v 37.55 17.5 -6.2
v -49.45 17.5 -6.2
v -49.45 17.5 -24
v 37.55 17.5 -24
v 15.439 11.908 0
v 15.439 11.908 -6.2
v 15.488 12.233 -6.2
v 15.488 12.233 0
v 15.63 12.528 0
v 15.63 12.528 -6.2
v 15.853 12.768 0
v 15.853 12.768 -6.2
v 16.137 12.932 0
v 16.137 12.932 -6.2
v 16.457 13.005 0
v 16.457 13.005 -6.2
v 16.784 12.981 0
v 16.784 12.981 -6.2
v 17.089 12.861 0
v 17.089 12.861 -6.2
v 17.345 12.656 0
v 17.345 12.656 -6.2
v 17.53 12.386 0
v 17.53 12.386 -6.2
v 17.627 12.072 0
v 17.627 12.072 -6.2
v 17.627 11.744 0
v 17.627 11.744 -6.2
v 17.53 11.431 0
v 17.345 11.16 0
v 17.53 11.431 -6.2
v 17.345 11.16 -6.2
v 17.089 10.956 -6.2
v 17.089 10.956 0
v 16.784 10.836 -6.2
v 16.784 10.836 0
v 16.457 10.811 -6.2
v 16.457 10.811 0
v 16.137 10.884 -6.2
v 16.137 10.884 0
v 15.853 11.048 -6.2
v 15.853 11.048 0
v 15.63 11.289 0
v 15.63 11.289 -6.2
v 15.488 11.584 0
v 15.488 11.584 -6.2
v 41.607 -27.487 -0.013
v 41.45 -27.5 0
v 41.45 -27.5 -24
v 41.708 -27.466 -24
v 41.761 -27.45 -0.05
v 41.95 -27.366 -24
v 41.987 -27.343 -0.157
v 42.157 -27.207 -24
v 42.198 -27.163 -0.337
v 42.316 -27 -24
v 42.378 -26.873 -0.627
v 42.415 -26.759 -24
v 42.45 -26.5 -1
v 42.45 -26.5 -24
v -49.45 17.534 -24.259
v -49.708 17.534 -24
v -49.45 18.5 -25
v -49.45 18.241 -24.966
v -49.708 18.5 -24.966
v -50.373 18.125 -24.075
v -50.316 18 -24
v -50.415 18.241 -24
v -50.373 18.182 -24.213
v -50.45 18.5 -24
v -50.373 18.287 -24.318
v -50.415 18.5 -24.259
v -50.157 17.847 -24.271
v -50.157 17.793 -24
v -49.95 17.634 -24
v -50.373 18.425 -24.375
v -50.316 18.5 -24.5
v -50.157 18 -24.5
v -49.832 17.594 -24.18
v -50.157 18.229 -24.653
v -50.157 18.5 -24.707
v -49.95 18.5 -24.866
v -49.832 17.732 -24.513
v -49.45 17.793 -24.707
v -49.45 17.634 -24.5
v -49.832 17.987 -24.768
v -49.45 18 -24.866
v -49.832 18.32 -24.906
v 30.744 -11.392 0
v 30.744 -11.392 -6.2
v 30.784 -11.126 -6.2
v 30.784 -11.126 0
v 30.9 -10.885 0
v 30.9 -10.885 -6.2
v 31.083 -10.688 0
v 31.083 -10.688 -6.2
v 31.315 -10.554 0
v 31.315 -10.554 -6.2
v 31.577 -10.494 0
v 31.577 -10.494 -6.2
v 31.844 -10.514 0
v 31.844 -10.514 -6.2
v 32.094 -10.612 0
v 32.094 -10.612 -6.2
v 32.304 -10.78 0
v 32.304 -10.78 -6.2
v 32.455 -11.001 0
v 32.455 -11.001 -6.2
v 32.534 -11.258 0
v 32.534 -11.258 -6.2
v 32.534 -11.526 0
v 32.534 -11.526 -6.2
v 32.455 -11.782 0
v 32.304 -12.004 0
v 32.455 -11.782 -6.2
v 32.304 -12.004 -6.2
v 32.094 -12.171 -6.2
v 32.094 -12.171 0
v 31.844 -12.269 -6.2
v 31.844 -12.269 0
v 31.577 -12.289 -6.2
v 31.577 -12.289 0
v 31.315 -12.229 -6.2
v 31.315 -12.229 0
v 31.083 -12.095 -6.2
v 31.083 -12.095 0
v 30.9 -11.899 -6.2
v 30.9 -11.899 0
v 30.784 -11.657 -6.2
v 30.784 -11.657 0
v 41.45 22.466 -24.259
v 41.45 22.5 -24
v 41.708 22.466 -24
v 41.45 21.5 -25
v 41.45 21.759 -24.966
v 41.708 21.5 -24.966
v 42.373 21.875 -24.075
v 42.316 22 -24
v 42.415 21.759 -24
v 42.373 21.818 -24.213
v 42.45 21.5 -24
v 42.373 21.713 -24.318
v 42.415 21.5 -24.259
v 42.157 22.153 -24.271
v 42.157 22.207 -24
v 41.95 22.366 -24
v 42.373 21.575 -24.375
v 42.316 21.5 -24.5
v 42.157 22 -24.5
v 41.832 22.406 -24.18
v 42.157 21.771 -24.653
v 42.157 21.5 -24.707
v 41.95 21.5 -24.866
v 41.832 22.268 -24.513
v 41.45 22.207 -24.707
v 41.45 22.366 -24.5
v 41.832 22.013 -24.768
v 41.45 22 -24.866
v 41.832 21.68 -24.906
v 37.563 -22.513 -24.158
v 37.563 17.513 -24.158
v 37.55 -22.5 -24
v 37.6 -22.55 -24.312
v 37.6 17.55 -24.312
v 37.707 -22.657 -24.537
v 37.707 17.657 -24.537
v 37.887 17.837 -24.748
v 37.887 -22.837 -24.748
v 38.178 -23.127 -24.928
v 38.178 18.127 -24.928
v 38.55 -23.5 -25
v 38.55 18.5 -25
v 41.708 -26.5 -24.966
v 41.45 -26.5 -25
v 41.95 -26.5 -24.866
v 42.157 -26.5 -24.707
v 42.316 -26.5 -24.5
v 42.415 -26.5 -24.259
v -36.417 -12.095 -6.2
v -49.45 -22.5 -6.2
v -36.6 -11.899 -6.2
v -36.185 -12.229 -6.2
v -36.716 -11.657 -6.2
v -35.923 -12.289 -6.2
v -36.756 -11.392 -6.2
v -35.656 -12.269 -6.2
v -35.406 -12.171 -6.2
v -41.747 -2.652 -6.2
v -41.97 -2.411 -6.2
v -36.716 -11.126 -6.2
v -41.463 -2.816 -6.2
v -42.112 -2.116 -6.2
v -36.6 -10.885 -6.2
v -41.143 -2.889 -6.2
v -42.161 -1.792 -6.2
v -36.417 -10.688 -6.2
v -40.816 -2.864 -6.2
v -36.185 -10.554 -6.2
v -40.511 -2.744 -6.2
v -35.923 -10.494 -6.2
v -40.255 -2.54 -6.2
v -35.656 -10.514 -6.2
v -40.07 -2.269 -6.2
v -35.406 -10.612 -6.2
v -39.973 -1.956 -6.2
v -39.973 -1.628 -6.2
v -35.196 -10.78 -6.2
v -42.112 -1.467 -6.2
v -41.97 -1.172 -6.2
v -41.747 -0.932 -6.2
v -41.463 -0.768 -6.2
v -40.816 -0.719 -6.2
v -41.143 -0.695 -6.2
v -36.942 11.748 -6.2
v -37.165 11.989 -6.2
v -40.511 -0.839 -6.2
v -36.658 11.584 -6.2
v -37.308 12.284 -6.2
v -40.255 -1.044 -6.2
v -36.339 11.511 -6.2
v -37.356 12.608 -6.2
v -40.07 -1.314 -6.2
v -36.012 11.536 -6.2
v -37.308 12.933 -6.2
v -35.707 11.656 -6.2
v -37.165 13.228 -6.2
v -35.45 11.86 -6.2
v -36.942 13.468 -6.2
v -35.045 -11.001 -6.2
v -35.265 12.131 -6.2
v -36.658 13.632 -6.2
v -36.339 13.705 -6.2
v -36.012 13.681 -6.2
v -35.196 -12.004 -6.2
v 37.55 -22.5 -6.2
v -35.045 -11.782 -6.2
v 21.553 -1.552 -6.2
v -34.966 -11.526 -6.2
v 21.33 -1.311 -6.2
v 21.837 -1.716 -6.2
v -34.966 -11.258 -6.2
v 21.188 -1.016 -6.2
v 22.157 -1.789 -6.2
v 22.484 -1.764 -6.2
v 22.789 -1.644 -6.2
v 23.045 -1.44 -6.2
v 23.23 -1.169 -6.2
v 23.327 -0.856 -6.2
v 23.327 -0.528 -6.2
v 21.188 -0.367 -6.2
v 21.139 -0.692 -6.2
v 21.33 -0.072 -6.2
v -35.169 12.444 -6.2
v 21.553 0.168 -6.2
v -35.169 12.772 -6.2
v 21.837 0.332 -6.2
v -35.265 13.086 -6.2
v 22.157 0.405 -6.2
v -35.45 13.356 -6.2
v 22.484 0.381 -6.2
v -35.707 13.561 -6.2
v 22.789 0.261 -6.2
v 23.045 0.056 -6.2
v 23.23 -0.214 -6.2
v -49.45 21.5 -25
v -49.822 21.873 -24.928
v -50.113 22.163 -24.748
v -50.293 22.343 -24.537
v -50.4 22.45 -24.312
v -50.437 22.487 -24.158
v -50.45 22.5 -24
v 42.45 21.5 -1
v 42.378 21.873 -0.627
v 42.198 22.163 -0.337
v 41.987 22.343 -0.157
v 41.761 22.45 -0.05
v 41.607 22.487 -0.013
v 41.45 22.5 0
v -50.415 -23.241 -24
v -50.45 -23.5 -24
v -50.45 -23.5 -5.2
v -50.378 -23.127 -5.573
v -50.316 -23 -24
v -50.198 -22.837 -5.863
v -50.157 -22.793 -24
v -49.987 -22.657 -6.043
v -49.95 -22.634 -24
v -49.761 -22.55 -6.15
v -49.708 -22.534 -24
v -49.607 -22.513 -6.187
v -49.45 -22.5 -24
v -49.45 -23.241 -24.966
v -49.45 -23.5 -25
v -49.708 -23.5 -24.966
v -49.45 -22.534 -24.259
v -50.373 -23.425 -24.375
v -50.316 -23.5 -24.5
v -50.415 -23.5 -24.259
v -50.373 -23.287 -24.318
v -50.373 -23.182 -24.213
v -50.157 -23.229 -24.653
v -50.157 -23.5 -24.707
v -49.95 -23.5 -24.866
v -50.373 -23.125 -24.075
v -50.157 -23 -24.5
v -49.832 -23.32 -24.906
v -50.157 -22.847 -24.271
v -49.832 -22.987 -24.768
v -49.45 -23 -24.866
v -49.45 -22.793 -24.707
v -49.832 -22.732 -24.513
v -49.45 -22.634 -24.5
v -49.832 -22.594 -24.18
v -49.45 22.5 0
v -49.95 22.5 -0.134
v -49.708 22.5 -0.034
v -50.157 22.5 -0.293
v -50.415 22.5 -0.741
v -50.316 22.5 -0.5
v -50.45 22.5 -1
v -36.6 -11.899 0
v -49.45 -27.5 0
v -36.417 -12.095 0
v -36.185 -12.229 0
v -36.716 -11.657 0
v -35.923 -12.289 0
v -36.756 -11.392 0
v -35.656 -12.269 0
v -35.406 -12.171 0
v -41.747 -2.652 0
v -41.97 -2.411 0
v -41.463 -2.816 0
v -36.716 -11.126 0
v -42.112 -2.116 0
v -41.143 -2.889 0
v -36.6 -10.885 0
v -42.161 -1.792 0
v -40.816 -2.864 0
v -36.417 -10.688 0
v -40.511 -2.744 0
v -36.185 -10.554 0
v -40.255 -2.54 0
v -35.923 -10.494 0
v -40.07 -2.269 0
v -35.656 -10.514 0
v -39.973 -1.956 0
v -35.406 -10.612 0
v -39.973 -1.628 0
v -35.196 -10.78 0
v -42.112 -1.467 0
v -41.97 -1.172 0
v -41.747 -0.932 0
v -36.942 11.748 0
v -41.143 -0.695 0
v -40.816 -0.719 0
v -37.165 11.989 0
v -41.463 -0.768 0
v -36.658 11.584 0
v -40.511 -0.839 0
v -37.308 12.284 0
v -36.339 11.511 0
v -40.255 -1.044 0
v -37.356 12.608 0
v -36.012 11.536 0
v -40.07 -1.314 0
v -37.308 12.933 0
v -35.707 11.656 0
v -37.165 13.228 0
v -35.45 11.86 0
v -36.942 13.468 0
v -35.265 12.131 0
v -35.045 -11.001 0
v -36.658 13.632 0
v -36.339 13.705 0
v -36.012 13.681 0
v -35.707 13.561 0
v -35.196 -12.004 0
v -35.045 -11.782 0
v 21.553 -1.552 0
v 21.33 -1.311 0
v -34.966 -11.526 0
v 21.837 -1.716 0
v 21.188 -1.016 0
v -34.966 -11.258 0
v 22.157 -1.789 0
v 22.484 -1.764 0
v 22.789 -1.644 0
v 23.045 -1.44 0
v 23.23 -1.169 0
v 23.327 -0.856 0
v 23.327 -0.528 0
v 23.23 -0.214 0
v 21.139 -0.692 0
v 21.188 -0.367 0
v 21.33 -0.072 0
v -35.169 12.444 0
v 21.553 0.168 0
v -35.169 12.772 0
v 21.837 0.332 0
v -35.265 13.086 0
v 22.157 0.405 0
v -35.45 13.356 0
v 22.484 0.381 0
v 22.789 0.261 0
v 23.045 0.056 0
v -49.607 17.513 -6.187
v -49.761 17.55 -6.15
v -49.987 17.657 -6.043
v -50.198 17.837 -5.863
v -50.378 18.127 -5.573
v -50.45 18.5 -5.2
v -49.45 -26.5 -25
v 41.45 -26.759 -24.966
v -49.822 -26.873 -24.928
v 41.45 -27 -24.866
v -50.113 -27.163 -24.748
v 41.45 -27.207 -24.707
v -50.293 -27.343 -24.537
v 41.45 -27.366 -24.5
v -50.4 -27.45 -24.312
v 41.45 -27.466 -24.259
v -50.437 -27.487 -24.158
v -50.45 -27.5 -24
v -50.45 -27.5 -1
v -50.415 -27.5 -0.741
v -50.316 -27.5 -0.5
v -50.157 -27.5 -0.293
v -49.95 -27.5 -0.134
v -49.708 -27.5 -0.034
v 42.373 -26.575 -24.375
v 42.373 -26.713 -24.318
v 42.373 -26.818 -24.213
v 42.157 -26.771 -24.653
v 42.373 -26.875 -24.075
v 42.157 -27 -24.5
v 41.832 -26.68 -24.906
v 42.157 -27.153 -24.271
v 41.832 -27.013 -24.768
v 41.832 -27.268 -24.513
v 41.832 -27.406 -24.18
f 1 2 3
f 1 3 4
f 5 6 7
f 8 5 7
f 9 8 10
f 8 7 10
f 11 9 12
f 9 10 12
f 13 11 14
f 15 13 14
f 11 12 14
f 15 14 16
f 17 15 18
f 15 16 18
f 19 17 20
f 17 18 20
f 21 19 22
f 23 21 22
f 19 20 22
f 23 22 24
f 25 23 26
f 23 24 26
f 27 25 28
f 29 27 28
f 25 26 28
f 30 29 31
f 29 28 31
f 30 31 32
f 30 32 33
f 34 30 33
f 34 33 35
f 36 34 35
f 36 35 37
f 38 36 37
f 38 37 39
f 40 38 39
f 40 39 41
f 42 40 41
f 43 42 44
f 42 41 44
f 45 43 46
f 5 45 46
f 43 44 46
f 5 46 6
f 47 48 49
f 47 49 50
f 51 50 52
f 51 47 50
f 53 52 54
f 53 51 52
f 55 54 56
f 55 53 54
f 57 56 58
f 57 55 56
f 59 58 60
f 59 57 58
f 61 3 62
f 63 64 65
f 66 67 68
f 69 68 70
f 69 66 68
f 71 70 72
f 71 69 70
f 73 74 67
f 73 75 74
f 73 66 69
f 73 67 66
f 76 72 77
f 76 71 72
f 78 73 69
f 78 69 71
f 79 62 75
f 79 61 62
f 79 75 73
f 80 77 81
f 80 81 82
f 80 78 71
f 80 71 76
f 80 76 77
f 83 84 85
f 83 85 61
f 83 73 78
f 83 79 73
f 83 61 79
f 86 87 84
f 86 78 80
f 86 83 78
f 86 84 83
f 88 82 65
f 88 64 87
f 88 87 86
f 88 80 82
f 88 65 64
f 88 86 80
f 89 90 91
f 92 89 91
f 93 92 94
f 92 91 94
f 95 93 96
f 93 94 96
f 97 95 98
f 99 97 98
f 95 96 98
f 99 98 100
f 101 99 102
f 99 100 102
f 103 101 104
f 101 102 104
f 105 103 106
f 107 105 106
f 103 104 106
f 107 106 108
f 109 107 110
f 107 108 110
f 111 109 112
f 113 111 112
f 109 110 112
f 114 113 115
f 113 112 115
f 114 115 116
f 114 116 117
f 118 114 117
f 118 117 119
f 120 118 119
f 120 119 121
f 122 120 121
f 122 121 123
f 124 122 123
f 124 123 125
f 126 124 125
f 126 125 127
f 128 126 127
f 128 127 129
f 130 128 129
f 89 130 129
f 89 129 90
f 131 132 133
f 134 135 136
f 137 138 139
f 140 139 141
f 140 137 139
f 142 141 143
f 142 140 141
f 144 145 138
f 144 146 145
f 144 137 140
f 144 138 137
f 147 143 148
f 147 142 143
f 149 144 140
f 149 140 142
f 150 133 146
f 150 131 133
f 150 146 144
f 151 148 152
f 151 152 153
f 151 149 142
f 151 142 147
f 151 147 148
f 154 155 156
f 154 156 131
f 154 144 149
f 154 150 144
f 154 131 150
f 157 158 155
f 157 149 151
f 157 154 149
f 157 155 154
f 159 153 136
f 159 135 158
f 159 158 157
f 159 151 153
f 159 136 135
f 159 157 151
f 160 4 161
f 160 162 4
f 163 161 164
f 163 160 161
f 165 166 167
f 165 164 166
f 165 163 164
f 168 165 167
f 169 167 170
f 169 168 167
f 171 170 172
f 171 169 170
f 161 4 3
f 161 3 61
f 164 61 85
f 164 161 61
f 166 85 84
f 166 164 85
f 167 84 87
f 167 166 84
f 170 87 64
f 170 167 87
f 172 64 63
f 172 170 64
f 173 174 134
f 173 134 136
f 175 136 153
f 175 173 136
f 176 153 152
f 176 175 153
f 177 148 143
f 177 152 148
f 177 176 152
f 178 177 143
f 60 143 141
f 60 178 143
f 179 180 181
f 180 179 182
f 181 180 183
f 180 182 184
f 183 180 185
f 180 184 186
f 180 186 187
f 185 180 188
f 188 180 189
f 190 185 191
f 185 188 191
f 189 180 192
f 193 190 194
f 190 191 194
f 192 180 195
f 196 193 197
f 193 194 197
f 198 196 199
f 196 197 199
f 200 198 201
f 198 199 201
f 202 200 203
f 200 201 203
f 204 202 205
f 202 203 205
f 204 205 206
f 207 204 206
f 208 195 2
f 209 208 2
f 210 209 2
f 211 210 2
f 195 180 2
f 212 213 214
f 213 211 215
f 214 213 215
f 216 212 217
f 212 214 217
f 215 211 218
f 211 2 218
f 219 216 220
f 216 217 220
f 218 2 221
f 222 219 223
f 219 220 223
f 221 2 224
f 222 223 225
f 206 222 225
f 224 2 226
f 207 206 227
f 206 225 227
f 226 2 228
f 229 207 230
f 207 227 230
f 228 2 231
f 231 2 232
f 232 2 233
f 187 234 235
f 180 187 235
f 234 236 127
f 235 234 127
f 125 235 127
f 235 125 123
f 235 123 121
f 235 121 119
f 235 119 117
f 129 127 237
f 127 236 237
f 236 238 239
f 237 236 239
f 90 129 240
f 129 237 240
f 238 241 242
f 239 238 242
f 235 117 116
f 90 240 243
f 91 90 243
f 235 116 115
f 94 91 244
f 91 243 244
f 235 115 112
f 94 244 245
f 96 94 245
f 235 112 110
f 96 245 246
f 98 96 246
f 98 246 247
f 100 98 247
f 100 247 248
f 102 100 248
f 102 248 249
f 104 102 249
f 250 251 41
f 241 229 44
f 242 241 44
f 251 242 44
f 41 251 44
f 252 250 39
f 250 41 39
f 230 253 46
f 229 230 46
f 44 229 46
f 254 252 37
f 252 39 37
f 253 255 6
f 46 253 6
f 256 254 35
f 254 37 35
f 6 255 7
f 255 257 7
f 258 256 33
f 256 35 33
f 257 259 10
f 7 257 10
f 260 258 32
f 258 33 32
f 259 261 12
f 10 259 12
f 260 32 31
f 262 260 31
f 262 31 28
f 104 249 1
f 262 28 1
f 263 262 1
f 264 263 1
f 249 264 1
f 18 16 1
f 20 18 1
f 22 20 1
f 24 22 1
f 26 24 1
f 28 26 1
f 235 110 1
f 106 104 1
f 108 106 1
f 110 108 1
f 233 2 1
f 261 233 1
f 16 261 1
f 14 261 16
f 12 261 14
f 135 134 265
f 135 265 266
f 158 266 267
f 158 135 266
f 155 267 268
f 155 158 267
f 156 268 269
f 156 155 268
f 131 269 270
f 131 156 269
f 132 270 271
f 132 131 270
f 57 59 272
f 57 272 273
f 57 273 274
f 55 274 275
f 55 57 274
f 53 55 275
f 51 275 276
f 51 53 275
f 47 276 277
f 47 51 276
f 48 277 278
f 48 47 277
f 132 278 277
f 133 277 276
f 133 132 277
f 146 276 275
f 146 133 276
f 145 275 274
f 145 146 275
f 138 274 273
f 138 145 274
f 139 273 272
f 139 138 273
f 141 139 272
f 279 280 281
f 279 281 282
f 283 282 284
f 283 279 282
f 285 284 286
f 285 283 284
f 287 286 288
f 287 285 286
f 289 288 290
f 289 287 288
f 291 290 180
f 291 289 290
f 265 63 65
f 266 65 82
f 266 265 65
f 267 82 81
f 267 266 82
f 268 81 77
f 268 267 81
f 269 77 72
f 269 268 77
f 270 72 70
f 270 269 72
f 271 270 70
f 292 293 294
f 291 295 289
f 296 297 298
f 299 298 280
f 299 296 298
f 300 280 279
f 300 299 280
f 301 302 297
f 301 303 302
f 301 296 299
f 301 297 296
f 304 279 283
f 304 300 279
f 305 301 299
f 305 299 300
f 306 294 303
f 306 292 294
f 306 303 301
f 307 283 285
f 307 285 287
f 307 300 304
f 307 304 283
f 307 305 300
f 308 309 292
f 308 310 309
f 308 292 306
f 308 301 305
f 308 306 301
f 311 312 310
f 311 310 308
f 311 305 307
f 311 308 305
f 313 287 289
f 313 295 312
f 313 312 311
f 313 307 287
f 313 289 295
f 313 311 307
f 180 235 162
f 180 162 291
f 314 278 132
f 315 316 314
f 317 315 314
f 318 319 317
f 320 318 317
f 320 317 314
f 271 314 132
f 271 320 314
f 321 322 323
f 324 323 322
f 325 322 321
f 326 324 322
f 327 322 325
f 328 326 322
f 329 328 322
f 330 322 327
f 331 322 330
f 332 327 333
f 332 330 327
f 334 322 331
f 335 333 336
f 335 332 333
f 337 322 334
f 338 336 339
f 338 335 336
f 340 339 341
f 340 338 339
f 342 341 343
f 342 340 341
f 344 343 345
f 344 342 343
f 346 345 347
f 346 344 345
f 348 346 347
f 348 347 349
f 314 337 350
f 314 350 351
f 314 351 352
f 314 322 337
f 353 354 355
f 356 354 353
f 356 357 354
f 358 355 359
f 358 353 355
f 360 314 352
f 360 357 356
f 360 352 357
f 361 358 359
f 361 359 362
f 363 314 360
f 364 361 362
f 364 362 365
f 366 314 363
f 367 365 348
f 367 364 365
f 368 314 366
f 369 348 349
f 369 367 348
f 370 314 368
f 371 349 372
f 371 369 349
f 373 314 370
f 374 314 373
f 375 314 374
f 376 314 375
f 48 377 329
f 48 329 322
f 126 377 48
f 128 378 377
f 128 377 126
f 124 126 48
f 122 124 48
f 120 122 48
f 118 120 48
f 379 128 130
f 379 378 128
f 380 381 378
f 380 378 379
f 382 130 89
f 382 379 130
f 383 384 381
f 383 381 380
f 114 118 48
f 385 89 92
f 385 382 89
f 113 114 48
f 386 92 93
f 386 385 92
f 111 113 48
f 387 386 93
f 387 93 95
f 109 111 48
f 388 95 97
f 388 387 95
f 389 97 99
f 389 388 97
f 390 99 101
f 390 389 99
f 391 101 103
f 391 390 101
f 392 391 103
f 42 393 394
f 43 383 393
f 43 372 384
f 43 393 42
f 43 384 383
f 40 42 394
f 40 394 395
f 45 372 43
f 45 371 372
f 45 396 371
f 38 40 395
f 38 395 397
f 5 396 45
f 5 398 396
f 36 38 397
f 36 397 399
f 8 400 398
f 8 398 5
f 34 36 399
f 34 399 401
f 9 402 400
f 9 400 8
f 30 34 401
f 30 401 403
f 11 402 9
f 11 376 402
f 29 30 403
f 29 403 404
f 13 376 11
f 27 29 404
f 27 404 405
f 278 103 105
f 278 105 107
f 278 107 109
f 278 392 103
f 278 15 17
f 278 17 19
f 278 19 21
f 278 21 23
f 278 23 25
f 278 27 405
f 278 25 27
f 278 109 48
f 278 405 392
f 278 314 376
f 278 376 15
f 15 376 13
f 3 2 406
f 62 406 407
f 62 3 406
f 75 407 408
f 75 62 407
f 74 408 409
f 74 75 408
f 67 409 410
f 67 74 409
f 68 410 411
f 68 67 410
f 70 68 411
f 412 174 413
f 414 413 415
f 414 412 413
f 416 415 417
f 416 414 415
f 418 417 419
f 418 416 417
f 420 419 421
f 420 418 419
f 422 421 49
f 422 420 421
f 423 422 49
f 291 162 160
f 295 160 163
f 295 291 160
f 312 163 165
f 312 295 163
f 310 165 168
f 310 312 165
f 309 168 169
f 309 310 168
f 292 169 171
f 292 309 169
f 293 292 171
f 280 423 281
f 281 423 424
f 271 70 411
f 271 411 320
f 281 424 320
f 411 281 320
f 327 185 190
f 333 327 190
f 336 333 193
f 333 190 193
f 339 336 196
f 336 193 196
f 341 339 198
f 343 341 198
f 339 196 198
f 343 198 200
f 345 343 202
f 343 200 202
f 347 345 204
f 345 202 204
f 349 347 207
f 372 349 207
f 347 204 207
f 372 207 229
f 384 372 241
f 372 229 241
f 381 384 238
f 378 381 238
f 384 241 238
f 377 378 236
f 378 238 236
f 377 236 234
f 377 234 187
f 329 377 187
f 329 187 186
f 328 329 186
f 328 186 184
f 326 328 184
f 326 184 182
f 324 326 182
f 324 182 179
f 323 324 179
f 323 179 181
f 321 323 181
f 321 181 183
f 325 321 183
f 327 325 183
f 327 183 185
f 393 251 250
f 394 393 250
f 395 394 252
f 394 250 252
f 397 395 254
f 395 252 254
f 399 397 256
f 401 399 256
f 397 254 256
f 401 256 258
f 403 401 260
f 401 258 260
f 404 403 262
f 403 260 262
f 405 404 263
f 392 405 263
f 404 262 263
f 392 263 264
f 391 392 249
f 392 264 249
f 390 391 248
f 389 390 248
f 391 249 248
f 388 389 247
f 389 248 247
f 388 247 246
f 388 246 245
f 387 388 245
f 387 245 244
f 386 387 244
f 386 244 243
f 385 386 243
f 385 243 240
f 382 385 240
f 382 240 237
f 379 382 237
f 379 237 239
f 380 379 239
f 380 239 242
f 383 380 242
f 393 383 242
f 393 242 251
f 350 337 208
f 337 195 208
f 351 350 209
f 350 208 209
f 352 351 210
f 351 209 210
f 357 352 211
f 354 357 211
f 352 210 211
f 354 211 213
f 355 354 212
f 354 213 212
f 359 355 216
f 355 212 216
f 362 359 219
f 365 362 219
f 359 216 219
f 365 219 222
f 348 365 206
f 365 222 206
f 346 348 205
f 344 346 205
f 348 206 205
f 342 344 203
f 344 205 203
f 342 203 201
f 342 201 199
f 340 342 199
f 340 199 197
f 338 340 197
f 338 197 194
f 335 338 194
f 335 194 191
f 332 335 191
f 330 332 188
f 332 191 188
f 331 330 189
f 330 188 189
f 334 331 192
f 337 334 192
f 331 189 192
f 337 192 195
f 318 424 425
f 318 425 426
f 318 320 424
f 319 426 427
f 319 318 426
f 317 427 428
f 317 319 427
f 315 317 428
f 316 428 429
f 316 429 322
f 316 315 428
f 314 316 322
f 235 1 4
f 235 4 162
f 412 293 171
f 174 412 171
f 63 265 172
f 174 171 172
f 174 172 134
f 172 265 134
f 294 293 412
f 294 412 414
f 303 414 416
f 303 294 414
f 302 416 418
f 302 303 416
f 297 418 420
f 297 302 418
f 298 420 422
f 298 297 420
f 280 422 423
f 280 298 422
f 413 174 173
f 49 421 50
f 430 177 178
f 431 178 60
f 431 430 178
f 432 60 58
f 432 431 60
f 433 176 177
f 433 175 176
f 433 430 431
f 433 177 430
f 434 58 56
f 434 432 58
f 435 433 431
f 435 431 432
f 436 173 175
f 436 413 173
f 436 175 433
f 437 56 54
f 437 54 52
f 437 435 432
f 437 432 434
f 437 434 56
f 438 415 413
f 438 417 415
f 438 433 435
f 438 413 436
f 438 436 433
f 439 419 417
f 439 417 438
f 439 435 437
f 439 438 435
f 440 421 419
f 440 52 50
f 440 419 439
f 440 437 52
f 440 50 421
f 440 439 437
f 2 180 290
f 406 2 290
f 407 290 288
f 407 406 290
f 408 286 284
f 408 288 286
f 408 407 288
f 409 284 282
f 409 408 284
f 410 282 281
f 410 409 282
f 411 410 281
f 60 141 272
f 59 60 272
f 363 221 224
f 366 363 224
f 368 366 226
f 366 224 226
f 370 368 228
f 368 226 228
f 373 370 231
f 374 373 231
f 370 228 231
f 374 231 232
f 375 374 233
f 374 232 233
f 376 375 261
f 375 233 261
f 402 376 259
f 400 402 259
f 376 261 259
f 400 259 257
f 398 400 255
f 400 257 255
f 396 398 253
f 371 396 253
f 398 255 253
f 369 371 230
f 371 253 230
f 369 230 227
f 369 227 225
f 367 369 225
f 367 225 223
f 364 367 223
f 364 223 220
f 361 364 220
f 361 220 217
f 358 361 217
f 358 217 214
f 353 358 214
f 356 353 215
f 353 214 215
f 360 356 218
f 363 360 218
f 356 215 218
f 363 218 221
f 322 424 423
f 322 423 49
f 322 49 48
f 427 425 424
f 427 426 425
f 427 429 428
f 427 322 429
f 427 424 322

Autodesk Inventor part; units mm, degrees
ref_plane "YZ Plane" through (0, 0, 0) normal (1, 0, 0) x (0, 1, 0)
ref_plane "XZ Plane" through (0, 0, 0) normal (0, 1, 0) x (-1, 0, 0)
ref_plane "XY Plane" through (0, 0, 0) normal (0, 0, 1) x (1, 0, 0)
sketch "스케치1" plane through (0, 0, 0) normal (0, 0, 1) x (1, 0, 0)
  line L0 (-50.4495, 22.5) -> (42.4495, 22.5)
  line L1 (42.4495, 22.5) -> (42.4495, -27.5)
  line L2 (42.4495, -27.5) -> (-50.4495, -27.5)
  line L3 (-50.4495, -27.5) -> (-50.4495, 22.5)
  line L4 (-50.4495, 17.5) -> (37.5505, 17.5)
  line L5 (37.5505, 17.5) -> (37.5505, -22.5)
  line L6 (37.5505, -22.5) -> (-50.4495, -22.5)
  point P0 (0, 0)
  dimension "d0" = 40
  dimension "d1" = 88
  dimension "d2" = 5
  dimension "d3" = 5
extrude "돌출1" add sketch "스케치1" against normal blind 6.2 contours L4 L5 L6 L3
extrude "돌출2" add sketch "스케치1" against normal blind 25 contours L0 L1 L2 L3 L6 L5 L4
sketch "스케치2" plane through (0, 0, -6.2) normal (0, 0, -1) x (-1, 0, 0)
  circle A0 centre (36.2565, 12.6083) radius 1.1
  circle A1 centre (-16.5389, 11.9083) radius 1.1
  circle A2 centre (41.0611, -1.7917) radius 1.1
  circle A3 centre (-22.2389, -0.6917) radius 1.1
  circle A4 centre (35.8561, -11.3917) radius 0.9
  circle A5 centre (-31.6439, -11.3917) radius 0.9
  point P0 (0, 0)
  dimension "d8" = 52.8
  dimension "d9" = 2.2
  dimension "d10" = 2.2
  dimension "d11" = 2.2
  dimension "d12" = 2.2
  dimension "d13" = 63.3
  dimension "d14" = 14.4
  dimension "d15" = 12.6
  dimension "d16" = 1.8
  dimension "d17" = 1.8
  dimension "d18" = 67.5
  dimension "d19" = 10.7
  dimension "d23" = 9.405
  dimension "d24" = 0
  dimension "d25" = 0.7
  dimension "d26" = 5.7
extrude "돌출3" cut sketch "스케치2" against normal blind 63.3
sketch "스케치3" plane through (42.4495, -27.5, 0) normal (1, 0, 0) x (0, 0, -1)
  line L0 (-14.75, 0) -> (-14.75, 50)
  line L1 (-14.75, 50) -> (39.75, 50)
  line L2 (39.75, 50) -> (39.75, 0)
  line L3 (39.75, 0) -> (-14.75, 0)
  line L4 (0, 0) -> (0, 50) projected
  line L5 (-9.15, 0) -> (-9.15, 50)
  line L6 (34.15, 0) -> (34.15, 50)
  point P0 (0, 27.5)
  dimension "d27" = 54.5
  dimension "d28" = 14.75
  dimension "d29" = 5.6
  dimension "d30" = 43.3
extrude "돌출4" add sketch "스케치3" along normal blind 10
extrude "돌출5" add sketch "스케치3" along normal blind 80 contours L0 L1 L5 L3 | L6 L1 L2 L3
sketch "스케치4" plane through (42.4495, -27.5, 14.75) normal (0, 0, 1) x (1, 0, 0)
  circle A0 centre (25, 27.5) radius 3.75
  line L0 (0, 50) -> (0, 0) projected
  point P0 (-42.4495, 27.5)
  dimension "d35" = 7.5
  dimension "d36" = 25
extrude "돌출6" cut sketch "스케치4" against normal blind 80
ref_plane "작업 평면1" through (42.4495, -27.5, 0) normal (-1, 0, 0) x (0, 0, 1)
split "분할1" plane through (42.4495, -27.5, 0) removes the side toward (1, 0, 0)
sketch "스케치5" plane through (42.4495, -27.5, 0) normal (1, 0, 0) x (0, 0, -1)
  point P0 (0, 27.5)
sketch "스케치6" plane through (42.4495, -27.5, 0) normal (1, 0, 0) x (0, 0, -1)
  point P0 (0, 27.5)
fillet "모깎기2" radius 1 15 edges at (-6.4495, -22.5, -25) (37.5505, -2.5, -25) (-6.4495, 17.5, -25) (-4, 22.5, -25) (-50.4495, 20, -25) (-50.4495, -25, -25) (-4, -27.5, -25) (42.4495, -2.5, -25) (42.4495, -2.5, 0) (-50.4495, -2.5, 0) (-50.4495, -2.5, -6.2) (-50.4495, 17.5, -15.6) (-50.4495, -22.5, -15.6) (42.4495, 22.5, -12.5) (42.4495, -27.5, -12.5)
equation "\"d21\" = d13"
properties part number "Camera Housing Camera2"
